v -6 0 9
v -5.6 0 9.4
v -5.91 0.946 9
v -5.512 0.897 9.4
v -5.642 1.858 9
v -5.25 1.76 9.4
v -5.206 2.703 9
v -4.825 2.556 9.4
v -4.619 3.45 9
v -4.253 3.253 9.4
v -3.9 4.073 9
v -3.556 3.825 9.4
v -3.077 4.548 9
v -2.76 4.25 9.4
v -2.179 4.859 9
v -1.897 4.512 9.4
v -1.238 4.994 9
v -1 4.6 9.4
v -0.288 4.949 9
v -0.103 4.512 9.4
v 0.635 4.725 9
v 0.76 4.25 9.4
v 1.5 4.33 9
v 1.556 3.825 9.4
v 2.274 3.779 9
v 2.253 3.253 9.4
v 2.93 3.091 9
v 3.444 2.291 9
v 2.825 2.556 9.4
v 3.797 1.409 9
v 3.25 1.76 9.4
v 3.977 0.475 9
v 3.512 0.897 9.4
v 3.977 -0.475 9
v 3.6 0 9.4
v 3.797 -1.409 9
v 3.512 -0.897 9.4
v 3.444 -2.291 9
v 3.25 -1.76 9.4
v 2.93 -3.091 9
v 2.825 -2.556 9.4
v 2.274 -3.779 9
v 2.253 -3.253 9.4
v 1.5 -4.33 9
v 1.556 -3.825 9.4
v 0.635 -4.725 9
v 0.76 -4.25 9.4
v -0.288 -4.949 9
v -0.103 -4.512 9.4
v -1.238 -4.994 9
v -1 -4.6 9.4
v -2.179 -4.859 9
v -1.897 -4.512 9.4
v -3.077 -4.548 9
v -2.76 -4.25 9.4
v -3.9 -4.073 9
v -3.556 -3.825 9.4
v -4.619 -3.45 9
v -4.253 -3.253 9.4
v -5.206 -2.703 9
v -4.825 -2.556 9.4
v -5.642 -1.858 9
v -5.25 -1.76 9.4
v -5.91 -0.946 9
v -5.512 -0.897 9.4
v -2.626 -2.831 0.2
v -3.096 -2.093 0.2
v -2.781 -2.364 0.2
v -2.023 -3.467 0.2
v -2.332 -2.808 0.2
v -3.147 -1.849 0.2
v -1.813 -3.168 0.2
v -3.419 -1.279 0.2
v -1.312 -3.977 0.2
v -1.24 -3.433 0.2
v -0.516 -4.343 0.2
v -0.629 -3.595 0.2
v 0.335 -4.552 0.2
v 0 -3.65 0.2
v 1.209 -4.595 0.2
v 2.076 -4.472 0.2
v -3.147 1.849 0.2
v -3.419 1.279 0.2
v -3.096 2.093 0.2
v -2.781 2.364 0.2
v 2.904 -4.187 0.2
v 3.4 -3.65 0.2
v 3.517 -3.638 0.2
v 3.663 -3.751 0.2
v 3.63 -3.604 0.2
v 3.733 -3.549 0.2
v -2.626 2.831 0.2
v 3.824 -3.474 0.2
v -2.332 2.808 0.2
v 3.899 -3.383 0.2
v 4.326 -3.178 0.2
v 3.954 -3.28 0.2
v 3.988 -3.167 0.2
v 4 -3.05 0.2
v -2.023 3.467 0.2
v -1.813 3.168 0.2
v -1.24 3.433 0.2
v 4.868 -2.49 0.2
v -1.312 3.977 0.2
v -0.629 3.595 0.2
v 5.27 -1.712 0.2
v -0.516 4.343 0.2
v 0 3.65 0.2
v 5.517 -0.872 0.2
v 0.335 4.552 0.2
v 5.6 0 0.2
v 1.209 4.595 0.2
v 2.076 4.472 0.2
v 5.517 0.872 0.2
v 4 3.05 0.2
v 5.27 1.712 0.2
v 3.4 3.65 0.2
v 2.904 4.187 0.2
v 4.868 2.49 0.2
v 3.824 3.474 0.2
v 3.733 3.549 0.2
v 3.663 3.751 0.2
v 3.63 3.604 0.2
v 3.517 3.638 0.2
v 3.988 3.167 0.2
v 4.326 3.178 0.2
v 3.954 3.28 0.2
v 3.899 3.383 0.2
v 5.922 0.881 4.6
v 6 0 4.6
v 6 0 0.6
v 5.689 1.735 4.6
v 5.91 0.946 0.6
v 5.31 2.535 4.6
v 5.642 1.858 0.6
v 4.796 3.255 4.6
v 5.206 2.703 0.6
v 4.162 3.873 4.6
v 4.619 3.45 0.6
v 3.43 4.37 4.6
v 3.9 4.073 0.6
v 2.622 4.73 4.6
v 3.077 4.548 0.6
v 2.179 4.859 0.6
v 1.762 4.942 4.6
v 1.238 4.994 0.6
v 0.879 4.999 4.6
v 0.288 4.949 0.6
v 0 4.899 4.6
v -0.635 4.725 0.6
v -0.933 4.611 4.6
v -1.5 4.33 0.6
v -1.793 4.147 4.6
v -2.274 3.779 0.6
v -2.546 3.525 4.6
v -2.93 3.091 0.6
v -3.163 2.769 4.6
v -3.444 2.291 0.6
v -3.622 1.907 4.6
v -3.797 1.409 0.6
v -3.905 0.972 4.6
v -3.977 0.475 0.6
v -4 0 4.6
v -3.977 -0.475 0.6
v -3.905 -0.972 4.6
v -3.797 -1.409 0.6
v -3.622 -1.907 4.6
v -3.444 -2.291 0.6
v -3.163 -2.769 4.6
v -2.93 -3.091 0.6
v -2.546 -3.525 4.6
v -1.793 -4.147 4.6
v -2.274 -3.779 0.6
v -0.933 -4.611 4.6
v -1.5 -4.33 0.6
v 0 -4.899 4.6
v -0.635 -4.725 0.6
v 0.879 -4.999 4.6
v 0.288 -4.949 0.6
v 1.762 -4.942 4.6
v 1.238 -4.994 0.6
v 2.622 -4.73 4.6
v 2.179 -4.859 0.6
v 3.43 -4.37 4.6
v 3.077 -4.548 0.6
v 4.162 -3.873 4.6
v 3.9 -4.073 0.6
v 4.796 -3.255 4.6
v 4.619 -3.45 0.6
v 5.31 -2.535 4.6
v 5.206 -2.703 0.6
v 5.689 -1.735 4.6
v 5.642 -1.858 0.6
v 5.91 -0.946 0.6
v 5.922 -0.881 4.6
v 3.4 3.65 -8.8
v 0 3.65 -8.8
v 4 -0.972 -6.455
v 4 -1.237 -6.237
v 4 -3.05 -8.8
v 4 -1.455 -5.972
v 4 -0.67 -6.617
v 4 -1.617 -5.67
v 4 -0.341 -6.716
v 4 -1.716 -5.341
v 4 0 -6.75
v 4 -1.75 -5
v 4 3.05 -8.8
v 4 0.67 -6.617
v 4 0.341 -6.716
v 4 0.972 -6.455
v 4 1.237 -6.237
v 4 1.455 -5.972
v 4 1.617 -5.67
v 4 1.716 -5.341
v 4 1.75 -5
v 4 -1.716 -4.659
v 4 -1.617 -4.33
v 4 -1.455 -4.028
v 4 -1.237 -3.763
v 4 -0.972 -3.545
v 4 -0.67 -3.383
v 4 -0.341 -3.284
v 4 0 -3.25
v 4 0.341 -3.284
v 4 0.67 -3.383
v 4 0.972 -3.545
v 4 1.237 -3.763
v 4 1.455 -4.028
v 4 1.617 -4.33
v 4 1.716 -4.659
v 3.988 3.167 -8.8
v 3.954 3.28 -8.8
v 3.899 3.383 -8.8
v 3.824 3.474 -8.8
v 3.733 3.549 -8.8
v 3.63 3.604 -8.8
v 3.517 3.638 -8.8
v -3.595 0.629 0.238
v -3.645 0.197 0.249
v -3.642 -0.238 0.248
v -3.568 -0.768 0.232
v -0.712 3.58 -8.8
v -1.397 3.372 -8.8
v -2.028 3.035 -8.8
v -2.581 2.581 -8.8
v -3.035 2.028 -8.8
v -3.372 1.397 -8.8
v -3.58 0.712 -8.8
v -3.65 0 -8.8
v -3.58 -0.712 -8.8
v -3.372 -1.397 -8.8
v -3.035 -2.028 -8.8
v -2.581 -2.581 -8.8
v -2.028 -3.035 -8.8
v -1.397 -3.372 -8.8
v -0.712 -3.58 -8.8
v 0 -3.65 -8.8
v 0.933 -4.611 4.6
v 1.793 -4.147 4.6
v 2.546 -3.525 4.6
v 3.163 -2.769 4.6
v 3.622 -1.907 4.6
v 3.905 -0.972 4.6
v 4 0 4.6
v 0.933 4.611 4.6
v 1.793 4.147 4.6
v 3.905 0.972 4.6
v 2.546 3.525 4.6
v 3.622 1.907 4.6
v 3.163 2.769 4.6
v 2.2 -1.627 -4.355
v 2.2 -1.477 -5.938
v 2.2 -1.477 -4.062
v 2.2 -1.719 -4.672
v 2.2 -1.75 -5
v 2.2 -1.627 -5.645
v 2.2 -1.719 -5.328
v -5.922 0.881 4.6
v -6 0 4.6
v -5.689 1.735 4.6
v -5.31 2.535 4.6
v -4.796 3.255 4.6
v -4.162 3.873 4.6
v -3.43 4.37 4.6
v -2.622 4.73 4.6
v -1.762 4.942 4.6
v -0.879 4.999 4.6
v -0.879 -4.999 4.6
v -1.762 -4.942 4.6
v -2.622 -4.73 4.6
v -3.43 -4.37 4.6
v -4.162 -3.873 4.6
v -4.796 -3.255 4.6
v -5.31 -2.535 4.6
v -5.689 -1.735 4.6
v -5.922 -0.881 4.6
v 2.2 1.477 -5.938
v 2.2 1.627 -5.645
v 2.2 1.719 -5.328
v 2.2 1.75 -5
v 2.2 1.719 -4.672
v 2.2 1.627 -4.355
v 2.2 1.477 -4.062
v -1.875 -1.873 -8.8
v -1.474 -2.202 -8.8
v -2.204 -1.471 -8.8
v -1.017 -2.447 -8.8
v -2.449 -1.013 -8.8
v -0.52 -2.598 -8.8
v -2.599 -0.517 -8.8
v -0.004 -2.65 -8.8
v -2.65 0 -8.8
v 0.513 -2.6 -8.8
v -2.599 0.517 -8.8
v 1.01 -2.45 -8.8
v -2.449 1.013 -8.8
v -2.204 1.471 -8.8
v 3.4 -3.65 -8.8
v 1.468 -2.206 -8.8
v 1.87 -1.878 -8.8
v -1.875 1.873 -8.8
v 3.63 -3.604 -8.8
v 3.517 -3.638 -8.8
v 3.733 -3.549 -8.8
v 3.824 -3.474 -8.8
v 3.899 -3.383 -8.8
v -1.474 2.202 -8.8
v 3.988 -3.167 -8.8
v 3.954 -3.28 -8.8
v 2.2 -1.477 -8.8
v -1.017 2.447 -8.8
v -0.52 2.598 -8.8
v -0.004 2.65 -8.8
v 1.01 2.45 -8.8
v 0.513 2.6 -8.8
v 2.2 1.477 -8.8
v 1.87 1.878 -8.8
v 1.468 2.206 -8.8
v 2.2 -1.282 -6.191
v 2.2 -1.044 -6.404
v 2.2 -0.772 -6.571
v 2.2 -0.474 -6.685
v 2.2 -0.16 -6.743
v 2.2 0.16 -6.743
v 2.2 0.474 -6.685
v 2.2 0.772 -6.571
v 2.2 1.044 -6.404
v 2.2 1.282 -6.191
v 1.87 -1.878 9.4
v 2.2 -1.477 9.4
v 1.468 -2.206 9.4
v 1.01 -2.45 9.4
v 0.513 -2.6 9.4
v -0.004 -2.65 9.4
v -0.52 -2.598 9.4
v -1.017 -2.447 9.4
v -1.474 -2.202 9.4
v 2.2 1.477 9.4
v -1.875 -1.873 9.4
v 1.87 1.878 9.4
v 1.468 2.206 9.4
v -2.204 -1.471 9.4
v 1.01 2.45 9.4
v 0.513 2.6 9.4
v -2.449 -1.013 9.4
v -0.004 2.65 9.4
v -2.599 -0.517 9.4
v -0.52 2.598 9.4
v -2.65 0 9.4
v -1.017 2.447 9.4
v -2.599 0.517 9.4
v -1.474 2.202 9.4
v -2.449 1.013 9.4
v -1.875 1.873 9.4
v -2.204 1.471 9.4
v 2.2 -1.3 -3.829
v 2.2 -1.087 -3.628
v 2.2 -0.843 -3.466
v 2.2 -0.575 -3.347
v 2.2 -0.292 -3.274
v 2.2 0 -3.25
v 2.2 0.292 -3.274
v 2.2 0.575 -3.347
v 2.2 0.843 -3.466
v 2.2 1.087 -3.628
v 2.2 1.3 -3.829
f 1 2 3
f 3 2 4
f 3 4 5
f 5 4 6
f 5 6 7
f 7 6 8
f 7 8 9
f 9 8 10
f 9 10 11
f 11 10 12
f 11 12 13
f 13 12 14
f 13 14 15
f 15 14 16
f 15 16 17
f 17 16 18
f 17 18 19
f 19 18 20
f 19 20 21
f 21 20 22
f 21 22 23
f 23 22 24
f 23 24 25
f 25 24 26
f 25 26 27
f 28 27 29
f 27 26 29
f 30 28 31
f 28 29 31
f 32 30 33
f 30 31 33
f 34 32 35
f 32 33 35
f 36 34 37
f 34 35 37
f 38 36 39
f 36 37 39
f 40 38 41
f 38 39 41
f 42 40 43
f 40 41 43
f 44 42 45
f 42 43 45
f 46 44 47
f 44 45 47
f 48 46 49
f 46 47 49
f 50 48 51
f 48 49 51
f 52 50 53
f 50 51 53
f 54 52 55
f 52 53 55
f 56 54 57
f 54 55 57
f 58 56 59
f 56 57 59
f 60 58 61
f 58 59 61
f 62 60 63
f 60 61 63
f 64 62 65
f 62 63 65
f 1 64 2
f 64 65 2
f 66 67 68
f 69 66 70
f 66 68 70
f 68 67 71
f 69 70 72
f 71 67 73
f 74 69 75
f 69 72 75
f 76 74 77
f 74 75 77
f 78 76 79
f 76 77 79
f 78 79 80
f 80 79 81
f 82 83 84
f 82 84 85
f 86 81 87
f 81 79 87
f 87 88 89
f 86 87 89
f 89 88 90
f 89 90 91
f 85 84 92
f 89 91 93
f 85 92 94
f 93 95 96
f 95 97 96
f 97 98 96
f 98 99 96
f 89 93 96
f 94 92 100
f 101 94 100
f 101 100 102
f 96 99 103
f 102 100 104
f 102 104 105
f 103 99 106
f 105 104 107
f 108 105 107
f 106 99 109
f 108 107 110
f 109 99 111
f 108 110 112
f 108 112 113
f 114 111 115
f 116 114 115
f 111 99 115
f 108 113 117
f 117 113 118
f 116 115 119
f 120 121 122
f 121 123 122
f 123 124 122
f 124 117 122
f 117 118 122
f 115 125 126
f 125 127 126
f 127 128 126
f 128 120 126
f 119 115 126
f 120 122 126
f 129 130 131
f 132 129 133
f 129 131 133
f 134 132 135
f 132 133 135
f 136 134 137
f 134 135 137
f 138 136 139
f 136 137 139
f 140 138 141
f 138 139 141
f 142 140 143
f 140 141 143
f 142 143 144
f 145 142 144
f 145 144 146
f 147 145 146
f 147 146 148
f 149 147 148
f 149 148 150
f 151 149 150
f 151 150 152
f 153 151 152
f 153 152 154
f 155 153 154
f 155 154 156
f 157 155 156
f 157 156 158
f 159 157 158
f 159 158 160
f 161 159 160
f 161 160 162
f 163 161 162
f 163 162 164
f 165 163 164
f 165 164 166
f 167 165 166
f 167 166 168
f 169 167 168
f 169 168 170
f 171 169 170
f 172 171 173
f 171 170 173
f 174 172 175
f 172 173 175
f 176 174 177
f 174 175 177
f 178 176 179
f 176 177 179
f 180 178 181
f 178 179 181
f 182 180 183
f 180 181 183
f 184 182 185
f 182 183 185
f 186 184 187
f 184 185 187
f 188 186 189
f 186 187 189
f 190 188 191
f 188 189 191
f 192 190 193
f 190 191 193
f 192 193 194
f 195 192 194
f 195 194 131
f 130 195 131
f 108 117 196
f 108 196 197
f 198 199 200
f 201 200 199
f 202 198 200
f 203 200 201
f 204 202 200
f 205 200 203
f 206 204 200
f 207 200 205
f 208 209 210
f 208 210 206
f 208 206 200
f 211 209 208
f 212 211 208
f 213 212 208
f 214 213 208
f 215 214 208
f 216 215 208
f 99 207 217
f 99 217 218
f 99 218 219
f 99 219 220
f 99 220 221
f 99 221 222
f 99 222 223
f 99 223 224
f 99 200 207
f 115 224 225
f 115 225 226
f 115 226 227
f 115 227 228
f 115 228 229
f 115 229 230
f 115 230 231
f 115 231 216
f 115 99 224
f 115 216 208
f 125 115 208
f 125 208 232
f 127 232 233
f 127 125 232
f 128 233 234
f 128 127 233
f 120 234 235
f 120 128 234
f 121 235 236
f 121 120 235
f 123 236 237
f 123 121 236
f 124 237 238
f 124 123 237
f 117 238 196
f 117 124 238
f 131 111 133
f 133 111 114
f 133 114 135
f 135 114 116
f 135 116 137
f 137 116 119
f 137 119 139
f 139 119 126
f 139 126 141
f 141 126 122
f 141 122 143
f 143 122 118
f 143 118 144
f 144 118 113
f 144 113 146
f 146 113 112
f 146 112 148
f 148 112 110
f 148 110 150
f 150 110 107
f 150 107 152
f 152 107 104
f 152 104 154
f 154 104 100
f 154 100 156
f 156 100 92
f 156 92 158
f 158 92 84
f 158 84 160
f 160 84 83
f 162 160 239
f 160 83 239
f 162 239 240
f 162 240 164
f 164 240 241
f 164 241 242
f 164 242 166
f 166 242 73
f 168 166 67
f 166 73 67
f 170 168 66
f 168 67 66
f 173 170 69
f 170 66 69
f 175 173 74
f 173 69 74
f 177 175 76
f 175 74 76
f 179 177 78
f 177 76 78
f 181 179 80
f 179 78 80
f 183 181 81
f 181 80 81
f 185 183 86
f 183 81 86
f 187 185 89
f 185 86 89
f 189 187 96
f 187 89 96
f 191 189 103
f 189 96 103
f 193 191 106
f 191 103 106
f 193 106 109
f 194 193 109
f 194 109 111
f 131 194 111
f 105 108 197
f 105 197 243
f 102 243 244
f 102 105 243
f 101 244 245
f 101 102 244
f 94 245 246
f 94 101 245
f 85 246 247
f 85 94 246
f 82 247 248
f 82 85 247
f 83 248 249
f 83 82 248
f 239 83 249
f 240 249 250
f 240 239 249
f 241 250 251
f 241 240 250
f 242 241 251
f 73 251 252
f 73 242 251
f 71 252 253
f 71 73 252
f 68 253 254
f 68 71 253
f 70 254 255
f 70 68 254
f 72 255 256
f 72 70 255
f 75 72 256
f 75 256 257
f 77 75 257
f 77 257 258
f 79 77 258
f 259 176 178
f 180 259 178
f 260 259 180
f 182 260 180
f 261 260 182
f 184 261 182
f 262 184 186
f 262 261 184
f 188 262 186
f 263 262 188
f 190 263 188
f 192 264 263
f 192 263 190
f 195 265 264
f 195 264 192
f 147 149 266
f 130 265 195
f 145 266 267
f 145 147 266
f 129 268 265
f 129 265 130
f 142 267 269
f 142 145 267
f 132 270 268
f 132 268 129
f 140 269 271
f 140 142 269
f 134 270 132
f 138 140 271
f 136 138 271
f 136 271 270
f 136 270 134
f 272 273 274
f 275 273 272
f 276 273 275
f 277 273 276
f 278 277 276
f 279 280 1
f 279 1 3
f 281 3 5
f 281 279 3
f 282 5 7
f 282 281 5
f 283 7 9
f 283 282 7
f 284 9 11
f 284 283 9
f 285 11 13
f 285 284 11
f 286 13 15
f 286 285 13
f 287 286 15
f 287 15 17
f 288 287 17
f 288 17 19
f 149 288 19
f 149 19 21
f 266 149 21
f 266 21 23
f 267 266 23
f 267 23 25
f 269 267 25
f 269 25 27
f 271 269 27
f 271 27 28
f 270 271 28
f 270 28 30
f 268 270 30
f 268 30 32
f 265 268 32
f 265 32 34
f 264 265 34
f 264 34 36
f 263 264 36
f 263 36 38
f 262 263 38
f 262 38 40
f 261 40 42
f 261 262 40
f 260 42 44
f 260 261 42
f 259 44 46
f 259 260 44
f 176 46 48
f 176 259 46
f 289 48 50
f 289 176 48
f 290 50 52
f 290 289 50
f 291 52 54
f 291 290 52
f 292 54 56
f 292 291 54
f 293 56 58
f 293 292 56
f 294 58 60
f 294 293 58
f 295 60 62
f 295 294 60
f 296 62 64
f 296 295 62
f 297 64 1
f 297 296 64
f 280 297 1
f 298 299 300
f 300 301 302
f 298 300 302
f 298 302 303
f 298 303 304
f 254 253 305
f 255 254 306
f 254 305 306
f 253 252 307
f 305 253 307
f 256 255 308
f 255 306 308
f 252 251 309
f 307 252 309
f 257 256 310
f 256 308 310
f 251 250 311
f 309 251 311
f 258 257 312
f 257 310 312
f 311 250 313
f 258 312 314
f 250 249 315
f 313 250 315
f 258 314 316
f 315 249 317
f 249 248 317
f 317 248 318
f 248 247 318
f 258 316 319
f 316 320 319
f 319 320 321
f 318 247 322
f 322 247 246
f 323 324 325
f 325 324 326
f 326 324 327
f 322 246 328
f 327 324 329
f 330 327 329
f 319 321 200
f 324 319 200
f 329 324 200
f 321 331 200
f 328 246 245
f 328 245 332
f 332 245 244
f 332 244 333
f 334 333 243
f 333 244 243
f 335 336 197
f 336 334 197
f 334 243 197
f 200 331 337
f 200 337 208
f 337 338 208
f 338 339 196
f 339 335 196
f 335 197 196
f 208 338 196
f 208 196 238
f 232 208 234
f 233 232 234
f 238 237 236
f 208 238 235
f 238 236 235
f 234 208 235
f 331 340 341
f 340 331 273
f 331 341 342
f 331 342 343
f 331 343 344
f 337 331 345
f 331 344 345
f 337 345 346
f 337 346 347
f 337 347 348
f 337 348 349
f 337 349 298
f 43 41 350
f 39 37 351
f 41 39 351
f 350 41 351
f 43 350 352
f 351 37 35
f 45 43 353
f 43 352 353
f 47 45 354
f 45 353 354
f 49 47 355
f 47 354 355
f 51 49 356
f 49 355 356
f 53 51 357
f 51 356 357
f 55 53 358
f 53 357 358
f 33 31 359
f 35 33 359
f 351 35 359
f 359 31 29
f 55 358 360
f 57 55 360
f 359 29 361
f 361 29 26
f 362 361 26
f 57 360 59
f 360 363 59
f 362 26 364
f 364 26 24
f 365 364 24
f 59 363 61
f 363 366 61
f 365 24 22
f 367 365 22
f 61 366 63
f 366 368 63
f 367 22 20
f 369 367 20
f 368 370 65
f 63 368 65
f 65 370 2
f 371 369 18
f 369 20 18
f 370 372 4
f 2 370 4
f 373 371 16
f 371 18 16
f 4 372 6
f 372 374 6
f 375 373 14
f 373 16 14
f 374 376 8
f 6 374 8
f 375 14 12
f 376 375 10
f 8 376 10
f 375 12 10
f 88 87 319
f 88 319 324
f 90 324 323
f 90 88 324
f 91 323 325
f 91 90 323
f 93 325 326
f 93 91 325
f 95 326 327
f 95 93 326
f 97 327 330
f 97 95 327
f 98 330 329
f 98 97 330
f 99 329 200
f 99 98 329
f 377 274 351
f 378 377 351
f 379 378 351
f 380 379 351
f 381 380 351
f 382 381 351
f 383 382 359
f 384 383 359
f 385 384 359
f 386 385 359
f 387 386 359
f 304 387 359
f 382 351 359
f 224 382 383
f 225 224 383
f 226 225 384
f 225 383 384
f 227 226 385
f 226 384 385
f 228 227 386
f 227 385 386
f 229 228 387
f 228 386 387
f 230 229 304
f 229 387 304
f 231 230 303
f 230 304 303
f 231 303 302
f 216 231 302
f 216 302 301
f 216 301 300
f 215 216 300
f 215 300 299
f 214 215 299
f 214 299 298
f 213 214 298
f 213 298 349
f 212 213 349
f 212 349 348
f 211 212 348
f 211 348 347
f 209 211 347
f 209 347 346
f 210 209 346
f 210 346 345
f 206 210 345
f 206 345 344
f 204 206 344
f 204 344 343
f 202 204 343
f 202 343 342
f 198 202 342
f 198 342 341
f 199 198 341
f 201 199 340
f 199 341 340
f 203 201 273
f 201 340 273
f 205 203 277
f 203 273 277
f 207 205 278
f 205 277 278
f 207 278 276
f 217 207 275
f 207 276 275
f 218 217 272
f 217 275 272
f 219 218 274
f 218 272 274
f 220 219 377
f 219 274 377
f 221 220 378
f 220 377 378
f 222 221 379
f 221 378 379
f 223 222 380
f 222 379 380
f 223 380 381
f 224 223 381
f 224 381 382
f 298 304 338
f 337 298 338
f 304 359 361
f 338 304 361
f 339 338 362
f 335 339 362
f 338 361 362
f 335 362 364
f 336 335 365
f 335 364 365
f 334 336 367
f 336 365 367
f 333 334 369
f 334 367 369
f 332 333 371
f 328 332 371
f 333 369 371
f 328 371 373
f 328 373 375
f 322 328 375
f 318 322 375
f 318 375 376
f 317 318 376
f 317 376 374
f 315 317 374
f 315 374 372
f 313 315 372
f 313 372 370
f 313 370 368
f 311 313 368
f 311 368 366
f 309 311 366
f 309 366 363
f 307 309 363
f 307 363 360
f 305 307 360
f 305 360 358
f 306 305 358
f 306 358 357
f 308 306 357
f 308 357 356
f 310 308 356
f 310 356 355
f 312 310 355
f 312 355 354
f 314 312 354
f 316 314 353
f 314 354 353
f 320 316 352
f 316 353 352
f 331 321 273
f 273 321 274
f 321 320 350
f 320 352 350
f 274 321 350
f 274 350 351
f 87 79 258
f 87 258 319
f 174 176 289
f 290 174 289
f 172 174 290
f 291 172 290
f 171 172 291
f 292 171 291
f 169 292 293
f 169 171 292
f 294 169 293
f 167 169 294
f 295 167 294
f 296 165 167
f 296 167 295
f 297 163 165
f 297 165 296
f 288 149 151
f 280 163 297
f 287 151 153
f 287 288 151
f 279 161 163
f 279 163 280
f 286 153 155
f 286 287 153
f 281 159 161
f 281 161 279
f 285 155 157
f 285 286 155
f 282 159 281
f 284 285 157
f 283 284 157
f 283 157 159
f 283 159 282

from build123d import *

# Parameters (mm, degrees)
BOSS_EXTRUDE4_DEPTH      = 4.2
BOSS_EXTRUDE4_DEPTH_BACK = 0.2
SKETCH10_R               = 5
BOSS_EXTRUDE5_DEPTH      = 9
SKETCH16_R               = 5
BOSS_EXTRUDE6_DEPTH      = 4.8
CUT_EXTRUDE2_DEPTH       = 20.805049861
HOLEWZD2_D               = 3.5
HOLEWZD2_DEPTH           = 1.8
CHAMFER2_SIZE            = 0.4


with BuildPart() as part:
    # Sketch10 → Boss-Extrude4 (new, two sides: drawn at the far end of the back side and taken through both)
    with BuildSketch(Plane.XY.offset(0.4).offset(-BOSS_EXTRUDE4_DEPTH_BACK)):
        with Locations((1, 0)):
            Circle(SKETCH10_R)
    extrude(amount=BOSS_EXTRUDE4_DEPTH + BOSS_EXTRUDE4_DEPTH_BACK)

    # Sketch11 → Boss-Extrude5 (add)
    with BuildSketch(Plane(origin=(0, 0, 0.2), x_dir=(-1, 0, 0), z_dir=(0, 0, -1))):
        with BuildLine():
            Line((-4, -3.05), (-4, 3.05))
            ThreePointArc((-4, 3.05), (-3.824264069, 3.474264069), (-3.4, 3.65))
            Line((-3.4, 3.65), (0, 3.65))
            ThreePointArc((0, 3.65), (3.65, 0), (0, -3.65))
            Line((0, -3.65), (-3.4, -3.65))
            ThreePointArc((-3.4, -3.65), (-3.824264069, -3.474264069), (-4, -3.05))
        make_face()
    extrude(amount=BOSS_EXTRUDE5_DEPTH)

    # Sketch16 → Boss-Extrude6 (add)
    with BuildSketch(Plane(origin=(0, 0, 4.6), x_dir=(-1, 0, 0), z_dir=(0, 0, -1))):
        with Locations((1, 0)):
            Circle(SKETCH16_R)
    extrude(amount=-BOSS_EXTRUDE6_DEPTH)

    # Sketch17 → Cut-Extrude2 (cut, through all)
    with BuildSketch(Plane.XY.offset(9.4)):
        with BuildLine():
            Line((2.2, -1.47732867), (2.2, 1.47732867))
            ThreePointArc((2.2, 1.47732867), (-2.65, 0), (2.2, -1.47732867))
        make_face()
    extrude(amount=-CUT_EXTRUDE2_DEPTH, mode=Mode.SUBTRACT)

    # HoleWzd2
    with Locations(Plane(origin=(4, 0, 0), x_dir=(0, 0, -1), z_dir=(1, 0, 0))):
        with Locations((5, 0)):
            Hole(HOLEWZD2_D / 2, depth=HOLEWZD2_DEPTH)

    # Chamfer2
    # the kernel refuses this chamfer: 0.4 mm, written as the material it takes off along each edge
    with BuildSketch(Plane(origin=(-1, 0, 9.4), x_dir=(-1, 0, 0), z_dir=(0, -1, 0))) as chamfer2_piece_1:
        Polygon((5, CHAMFER2_SIZE), (5 - CHAMFER2_SIZE, 0), (5, 0), align=None)
    revolve(axis=Axis((-1, 0, 9.4), (0, 0, -1)), mode=Mode.SUBTRACT)
    with BuildSketch(Plane(origin=(1, 0, 0.2), x_dir=(1, 0, 0), z_dir=(0, -1, 0))) as chamfer2_piece_2_section:
        Polygon((5, CHAMFER2_SIZE), (5 - CHAMFER2_SIZE, 0), (5, 0), align=None)
    chamfer2_piece_2 = revolve(axis=Axis((1, 0, 0.2), (0, 0, 1)), mode=Mode.PRIVATE)
    chamfer2_piece_2 = chamfer2_piece_2 - Plane(origin=(0, 0, 0.390166904), x_dir=(0, 1, 0), z_dir=(0, 0, 1)) * Cylinder(3.65, 20, mode=Mode.PRIVATE)
    add(chamfer2_piece_2, mode=Mode.SUBTRACT)


solid = part.part
